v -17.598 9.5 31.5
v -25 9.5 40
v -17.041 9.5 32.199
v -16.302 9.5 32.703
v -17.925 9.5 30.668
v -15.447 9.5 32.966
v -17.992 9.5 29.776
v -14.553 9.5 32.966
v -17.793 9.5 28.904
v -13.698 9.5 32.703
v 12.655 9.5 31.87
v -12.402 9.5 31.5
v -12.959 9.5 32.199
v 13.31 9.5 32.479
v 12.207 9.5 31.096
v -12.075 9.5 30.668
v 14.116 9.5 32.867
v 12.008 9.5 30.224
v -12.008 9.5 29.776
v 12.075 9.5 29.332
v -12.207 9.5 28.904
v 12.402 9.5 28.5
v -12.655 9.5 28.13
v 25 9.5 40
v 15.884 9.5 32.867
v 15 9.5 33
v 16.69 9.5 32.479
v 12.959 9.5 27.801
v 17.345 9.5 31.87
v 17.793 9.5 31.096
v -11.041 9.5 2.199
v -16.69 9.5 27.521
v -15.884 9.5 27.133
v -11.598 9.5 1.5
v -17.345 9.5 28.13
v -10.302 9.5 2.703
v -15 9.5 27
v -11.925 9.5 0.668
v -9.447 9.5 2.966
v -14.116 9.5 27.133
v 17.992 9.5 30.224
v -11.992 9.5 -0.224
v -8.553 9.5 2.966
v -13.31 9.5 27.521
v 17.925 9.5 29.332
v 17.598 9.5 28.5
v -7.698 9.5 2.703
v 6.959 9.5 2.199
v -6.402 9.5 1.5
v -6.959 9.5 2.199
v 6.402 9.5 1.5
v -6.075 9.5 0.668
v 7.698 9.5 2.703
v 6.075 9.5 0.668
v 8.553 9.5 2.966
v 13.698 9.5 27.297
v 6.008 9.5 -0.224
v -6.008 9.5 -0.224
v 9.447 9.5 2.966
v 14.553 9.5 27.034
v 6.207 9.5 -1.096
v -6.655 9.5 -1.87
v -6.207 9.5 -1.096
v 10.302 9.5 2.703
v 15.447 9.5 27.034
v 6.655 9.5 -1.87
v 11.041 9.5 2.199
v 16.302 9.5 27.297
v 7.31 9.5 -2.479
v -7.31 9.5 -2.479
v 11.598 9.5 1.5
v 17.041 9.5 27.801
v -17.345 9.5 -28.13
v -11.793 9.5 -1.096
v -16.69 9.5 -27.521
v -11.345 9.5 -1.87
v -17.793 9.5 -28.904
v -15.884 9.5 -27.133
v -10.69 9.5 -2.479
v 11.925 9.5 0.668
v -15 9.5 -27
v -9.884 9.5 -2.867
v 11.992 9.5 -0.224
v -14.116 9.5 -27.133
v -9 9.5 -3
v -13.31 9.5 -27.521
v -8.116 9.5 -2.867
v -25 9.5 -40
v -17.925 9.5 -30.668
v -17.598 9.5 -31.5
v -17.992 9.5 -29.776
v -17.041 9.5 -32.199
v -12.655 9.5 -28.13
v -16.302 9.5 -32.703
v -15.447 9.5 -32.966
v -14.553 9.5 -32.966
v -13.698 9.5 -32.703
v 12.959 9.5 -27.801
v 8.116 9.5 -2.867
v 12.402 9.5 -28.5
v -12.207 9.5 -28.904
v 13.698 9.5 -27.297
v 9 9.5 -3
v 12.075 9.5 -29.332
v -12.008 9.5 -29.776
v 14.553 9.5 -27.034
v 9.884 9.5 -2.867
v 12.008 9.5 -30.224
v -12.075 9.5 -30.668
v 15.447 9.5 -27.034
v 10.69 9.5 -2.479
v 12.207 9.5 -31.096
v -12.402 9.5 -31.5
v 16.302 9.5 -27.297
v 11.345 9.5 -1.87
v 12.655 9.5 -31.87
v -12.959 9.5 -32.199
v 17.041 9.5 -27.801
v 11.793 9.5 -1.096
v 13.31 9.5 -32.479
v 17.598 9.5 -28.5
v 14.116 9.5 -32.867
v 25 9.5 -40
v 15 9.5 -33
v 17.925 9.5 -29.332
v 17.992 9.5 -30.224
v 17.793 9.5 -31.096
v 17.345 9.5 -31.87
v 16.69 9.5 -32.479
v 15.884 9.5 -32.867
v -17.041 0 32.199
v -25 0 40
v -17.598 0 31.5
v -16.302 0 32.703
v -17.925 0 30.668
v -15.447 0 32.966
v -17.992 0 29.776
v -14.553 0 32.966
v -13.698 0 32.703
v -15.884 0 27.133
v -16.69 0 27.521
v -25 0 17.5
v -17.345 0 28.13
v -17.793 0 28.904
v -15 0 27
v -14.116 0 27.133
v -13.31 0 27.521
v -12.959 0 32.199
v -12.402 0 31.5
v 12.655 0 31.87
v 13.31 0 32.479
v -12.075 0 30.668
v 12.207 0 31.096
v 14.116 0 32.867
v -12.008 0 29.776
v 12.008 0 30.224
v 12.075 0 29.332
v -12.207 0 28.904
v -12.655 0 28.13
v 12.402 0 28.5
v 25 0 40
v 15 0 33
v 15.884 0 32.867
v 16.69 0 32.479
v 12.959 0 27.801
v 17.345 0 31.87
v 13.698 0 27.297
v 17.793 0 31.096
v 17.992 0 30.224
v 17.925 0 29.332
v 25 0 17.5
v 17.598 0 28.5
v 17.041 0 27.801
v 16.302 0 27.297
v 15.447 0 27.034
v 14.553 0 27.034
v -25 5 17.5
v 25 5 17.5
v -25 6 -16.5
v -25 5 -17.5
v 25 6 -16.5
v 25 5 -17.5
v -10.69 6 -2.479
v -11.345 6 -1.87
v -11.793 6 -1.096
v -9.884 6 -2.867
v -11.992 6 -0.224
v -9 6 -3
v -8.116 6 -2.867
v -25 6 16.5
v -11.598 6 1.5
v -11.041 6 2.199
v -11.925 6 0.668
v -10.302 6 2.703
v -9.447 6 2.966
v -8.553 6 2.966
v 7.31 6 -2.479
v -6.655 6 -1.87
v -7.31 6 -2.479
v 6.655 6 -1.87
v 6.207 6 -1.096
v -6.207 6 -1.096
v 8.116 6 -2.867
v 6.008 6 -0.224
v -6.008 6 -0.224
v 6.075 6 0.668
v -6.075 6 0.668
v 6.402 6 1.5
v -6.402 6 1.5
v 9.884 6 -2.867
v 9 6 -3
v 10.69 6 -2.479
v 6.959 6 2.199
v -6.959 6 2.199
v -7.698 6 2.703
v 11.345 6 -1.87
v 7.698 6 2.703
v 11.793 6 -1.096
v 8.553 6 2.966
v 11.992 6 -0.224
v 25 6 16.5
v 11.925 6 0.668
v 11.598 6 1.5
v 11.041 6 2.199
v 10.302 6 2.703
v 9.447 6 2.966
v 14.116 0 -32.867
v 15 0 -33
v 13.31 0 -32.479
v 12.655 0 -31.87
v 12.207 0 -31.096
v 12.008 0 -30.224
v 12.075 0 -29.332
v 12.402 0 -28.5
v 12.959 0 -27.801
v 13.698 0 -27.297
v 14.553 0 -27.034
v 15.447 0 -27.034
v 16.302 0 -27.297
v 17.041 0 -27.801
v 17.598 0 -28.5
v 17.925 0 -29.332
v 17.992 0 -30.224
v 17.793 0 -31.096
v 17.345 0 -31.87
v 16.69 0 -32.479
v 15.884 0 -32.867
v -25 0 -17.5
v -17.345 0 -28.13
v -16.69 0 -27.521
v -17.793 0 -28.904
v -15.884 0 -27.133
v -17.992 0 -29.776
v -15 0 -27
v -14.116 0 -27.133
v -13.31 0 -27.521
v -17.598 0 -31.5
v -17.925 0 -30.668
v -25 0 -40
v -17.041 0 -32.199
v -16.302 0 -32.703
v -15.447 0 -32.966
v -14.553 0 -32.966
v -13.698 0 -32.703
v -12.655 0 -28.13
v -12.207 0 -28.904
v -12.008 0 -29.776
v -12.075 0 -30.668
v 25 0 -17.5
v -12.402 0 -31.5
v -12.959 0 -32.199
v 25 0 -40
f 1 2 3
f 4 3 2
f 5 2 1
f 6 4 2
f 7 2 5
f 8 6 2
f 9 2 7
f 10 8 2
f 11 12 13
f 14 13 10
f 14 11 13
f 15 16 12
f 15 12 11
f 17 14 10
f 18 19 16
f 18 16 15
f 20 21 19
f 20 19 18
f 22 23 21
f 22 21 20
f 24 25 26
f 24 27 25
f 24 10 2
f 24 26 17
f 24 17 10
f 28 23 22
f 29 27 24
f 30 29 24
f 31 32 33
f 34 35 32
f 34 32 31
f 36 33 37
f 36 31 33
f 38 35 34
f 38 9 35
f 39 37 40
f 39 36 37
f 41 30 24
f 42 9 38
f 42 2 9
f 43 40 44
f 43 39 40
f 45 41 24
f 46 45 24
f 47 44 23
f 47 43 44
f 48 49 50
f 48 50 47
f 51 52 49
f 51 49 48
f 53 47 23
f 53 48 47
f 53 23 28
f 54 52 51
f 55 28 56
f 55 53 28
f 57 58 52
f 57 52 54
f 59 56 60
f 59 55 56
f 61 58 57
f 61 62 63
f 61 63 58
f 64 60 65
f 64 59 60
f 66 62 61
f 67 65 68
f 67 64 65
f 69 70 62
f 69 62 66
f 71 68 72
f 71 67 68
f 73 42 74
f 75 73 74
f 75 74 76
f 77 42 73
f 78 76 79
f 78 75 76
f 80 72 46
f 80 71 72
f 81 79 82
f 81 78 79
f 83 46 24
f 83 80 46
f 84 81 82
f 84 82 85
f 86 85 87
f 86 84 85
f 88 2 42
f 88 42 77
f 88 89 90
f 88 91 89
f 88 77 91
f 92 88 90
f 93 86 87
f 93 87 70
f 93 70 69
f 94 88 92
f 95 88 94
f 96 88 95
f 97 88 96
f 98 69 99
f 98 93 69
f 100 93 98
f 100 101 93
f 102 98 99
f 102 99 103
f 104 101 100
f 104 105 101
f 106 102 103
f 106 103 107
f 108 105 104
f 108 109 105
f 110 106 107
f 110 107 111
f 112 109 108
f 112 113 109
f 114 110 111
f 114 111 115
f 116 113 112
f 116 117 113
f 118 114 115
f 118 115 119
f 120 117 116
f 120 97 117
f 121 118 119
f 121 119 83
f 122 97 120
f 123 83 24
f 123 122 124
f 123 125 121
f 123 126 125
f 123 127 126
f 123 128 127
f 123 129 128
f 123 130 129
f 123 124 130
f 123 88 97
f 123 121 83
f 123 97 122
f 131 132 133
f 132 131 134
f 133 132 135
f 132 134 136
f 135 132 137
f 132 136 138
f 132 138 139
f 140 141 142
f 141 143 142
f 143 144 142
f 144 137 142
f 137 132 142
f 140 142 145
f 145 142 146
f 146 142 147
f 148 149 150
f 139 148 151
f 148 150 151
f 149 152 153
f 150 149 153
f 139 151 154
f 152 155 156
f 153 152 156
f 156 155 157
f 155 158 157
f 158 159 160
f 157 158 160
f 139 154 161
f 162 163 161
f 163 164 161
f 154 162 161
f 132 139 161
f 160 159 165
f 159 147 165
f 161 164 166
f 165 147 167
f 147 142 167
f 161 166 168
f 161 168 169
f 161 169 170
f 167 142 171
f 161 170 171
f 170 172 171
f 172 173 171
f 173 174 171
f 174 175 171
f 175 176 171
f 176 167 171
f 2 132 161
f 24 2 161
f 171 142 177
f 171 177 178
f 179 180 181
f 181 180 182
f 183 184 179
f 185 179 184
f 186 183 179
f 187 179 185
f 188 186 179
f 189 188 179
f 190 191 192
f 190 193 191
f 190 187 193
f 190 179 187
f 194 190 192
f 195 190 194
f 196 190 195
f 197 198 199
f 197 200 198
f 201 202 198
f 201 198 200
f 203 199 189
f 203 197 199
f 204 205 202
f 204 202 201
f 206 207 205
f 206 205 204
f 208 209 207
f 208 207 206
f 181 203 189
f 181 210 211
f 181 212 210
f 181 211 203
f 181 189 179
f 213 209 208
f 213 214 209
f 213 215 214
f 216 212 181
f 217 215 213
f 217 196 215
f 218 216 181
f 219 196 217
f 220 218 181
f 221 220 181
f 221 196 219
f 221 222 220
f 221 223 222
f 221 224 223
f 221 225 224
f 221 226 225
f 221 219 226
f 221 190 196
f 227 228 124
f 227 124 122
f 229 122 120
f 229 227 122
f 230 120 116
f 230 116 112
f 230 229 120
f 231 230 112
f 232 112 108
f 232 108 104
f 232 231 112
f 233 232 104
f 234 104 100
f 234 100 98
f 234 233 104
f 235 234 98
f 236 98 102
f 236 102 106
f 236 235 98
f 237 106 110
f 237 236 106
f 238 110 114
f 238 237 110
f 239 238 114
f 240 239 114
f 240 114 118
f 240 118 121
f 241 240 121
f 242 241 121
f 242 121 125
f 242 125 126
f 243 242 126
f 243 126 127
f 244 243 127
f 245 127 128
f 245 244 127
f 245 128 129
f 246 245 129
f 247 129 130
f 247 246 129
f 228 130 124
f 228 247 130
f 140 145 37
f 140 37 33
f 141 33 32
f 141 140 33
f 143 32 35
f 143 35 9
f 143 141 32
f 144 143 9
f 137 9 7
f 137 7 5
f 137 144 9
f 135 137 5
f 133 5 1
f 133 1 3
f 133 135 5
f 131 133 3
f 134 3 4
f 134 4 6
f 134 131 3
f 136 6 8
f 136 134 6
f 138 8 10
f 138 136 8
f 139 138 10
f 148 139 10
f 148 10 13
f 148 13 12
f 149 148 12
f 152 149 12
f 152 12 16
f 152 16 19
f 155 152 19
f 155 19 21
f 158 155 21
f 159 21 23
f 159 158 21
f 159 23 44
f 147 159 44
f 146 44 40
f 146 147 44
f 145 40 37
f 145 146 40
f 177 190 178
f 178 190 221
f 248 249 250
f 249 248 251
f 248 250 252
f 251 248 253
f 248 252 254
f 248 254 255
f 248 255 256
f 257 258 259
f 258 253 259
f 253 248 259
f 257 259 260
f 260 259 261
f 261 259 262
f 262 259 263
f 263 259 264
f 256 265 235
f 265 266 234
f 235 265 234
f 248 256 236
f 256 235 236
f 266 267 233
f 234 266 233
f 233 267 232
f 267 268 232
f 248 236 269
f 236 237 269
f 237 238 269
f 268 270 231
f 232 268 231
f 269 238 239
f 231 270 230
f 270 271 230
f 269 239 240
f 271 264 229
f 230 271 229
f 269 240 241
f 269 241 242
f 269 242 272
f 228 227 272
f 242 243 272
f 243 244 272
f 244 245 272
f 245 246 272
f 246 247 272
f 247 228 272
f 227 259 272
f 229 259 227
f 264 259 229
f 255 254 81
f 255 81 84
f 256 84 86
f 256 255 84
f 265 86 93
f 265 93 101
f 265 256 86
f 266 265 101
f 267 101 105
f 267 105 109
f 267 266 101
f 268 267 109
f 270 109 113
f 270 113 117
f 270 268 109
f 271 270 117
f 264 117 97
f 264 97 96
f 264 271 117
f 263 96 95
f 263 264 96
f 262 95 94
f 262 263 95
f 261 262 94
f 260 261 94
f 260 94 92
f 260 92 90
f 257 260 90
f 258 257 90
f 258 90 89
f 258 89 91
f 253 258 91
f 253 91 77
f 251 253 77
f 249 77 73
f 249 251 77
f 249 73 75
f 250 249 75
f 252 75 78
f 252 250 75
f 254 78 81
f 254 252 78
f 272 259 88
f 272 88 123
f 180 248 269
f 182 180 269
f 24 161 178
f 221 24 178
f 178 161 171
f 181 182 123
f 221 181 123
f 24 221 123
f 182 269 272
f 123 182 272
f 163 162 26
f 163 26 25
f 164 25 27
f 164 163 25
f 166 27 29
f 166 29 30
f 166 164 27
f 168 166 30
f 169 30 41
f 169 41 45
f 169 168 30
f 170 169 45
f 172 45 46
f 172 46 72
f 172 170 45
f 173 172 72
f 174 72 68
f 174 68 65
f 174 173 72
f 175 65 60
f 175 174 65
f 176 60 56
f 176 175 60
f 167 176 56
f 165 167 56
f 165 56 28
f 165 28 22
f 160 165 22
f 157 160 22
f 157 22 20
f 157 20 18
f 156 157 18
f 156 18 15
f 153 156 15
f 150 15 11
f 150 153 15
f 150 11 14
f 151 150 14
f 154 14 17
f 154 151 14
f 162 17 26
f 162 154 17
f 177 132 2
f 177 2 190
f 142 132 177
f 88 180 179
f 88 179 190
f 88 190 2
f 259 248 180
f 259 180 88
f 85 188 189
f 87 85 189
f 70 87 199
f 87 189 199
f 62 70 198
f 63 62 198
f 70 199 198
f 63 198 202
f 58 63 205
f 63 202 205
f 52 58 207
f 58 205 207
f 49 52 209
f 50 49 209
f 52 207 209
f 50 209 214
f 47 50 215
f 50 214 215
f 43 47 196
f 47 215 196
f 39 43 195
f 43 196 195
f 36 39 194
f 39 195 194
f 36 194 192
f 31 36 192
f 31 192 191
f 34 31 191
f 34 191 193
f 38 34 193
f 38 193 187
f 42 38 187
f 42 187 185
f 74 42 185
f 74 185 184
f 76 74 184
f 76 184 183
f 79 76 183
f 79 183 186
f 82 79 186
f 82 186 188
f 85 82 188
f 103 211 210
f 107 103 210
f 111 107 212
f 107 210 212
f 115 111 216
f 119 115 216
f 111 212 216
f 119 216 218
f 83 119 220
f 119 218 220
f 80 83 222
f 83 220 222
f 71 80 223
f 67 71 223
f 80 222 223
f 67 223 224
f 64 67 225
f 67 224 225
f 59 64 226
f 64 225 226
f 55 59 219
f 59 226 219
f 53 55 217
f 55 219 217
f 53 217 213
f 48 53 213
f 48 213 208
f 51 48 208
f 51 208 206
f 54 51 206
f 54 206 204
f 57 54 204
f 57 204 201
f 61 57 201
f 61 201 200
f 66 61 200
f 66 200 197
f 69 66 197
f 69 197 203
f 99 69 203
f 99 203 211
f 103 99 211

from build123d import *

# Parameters (mm, degrees)
SKETCH1_W           = 50
SKETCH1_H           = 80
SKETCH1_R           = 3
BOSS_EXTRUDE1_DEPTH = 9.5
SKETCH2_W           = 80.10102192
SKETCH2_H           = 35
CUT_EXTRUDE1_DEPTH  = 6
SKETCH3_R           = 3
CUT_EXTRUDE2_DEPTH  = 48.549973712
CHAMFER1_SIZE       = 1


with BuildPart() as part:
    # Sketch1 → Boss-Extrude1 (new body)
    with BuildSketch(Plane(origin=(0, 0, 0), x_dir=(1, 0, 0), z_dir=(0, 1, 0))):
        Rectangle(SKETCH1_W, SKETCH1_H)
        with Locations(Location((-15, 30, 0), (0, 0, 270))):
            Circle(SKETCH1_R, mode=Mode.SUBTRACT)
        with Locations(Location((15, 30, 0), (0, 0, 90))):
            Circle(SKETCH1_R, mode=Mode.SUBTRACT)
        with Locations(Location((-15, -30, 0), (0, 0, 90))):
            Circle(SKETCH1_R, mode=Mode.SUBTRACT)
        with Locations(Location((15, -30, 0), (0, 0, 270))):
            Circle(SKETCH1_R, mode=Mode.SUBTRACT)
    extrude(amount=BOSS_EXTRUDE1_DEPTH)

    # Sketch2 → Cut-Extrude1 (cut)
    with BuildSketch(Plane.XZ):
        Rectangle(SKETCH2_W, SKETCH2_H)
    extrude(amount=-CUT_EXTRUDE1_DEPTH, mode=Mode.SUBTRACT)

    # Sketch3 → Cut-Extrude2 (cut, through all)
    with BuildSketch(Plane.XZ.offset(-6)):
        with Locations(Location((-9, 0, 0), (0, 0, 270))):
            Circle(SKETCH3_R)
        with Locations(Location((9, 0, 0), (0, 0, 270))):
            Circle(SKETCH3_R)
    extrude(amount=-CUT_EXTRUDE2_DEPTH, mode=Mode.SUBTRACT)

    # Chamfer1
    chamfer1_edges = [part.edges().sort_by_distance(p)[0] for p in [
        (0, 6, -17.5),
        (0, 6, 17.5),
    ]]
    chamfer(chamfer1_edges, length=CHAMFER1_SIZE)


solid = part.part
